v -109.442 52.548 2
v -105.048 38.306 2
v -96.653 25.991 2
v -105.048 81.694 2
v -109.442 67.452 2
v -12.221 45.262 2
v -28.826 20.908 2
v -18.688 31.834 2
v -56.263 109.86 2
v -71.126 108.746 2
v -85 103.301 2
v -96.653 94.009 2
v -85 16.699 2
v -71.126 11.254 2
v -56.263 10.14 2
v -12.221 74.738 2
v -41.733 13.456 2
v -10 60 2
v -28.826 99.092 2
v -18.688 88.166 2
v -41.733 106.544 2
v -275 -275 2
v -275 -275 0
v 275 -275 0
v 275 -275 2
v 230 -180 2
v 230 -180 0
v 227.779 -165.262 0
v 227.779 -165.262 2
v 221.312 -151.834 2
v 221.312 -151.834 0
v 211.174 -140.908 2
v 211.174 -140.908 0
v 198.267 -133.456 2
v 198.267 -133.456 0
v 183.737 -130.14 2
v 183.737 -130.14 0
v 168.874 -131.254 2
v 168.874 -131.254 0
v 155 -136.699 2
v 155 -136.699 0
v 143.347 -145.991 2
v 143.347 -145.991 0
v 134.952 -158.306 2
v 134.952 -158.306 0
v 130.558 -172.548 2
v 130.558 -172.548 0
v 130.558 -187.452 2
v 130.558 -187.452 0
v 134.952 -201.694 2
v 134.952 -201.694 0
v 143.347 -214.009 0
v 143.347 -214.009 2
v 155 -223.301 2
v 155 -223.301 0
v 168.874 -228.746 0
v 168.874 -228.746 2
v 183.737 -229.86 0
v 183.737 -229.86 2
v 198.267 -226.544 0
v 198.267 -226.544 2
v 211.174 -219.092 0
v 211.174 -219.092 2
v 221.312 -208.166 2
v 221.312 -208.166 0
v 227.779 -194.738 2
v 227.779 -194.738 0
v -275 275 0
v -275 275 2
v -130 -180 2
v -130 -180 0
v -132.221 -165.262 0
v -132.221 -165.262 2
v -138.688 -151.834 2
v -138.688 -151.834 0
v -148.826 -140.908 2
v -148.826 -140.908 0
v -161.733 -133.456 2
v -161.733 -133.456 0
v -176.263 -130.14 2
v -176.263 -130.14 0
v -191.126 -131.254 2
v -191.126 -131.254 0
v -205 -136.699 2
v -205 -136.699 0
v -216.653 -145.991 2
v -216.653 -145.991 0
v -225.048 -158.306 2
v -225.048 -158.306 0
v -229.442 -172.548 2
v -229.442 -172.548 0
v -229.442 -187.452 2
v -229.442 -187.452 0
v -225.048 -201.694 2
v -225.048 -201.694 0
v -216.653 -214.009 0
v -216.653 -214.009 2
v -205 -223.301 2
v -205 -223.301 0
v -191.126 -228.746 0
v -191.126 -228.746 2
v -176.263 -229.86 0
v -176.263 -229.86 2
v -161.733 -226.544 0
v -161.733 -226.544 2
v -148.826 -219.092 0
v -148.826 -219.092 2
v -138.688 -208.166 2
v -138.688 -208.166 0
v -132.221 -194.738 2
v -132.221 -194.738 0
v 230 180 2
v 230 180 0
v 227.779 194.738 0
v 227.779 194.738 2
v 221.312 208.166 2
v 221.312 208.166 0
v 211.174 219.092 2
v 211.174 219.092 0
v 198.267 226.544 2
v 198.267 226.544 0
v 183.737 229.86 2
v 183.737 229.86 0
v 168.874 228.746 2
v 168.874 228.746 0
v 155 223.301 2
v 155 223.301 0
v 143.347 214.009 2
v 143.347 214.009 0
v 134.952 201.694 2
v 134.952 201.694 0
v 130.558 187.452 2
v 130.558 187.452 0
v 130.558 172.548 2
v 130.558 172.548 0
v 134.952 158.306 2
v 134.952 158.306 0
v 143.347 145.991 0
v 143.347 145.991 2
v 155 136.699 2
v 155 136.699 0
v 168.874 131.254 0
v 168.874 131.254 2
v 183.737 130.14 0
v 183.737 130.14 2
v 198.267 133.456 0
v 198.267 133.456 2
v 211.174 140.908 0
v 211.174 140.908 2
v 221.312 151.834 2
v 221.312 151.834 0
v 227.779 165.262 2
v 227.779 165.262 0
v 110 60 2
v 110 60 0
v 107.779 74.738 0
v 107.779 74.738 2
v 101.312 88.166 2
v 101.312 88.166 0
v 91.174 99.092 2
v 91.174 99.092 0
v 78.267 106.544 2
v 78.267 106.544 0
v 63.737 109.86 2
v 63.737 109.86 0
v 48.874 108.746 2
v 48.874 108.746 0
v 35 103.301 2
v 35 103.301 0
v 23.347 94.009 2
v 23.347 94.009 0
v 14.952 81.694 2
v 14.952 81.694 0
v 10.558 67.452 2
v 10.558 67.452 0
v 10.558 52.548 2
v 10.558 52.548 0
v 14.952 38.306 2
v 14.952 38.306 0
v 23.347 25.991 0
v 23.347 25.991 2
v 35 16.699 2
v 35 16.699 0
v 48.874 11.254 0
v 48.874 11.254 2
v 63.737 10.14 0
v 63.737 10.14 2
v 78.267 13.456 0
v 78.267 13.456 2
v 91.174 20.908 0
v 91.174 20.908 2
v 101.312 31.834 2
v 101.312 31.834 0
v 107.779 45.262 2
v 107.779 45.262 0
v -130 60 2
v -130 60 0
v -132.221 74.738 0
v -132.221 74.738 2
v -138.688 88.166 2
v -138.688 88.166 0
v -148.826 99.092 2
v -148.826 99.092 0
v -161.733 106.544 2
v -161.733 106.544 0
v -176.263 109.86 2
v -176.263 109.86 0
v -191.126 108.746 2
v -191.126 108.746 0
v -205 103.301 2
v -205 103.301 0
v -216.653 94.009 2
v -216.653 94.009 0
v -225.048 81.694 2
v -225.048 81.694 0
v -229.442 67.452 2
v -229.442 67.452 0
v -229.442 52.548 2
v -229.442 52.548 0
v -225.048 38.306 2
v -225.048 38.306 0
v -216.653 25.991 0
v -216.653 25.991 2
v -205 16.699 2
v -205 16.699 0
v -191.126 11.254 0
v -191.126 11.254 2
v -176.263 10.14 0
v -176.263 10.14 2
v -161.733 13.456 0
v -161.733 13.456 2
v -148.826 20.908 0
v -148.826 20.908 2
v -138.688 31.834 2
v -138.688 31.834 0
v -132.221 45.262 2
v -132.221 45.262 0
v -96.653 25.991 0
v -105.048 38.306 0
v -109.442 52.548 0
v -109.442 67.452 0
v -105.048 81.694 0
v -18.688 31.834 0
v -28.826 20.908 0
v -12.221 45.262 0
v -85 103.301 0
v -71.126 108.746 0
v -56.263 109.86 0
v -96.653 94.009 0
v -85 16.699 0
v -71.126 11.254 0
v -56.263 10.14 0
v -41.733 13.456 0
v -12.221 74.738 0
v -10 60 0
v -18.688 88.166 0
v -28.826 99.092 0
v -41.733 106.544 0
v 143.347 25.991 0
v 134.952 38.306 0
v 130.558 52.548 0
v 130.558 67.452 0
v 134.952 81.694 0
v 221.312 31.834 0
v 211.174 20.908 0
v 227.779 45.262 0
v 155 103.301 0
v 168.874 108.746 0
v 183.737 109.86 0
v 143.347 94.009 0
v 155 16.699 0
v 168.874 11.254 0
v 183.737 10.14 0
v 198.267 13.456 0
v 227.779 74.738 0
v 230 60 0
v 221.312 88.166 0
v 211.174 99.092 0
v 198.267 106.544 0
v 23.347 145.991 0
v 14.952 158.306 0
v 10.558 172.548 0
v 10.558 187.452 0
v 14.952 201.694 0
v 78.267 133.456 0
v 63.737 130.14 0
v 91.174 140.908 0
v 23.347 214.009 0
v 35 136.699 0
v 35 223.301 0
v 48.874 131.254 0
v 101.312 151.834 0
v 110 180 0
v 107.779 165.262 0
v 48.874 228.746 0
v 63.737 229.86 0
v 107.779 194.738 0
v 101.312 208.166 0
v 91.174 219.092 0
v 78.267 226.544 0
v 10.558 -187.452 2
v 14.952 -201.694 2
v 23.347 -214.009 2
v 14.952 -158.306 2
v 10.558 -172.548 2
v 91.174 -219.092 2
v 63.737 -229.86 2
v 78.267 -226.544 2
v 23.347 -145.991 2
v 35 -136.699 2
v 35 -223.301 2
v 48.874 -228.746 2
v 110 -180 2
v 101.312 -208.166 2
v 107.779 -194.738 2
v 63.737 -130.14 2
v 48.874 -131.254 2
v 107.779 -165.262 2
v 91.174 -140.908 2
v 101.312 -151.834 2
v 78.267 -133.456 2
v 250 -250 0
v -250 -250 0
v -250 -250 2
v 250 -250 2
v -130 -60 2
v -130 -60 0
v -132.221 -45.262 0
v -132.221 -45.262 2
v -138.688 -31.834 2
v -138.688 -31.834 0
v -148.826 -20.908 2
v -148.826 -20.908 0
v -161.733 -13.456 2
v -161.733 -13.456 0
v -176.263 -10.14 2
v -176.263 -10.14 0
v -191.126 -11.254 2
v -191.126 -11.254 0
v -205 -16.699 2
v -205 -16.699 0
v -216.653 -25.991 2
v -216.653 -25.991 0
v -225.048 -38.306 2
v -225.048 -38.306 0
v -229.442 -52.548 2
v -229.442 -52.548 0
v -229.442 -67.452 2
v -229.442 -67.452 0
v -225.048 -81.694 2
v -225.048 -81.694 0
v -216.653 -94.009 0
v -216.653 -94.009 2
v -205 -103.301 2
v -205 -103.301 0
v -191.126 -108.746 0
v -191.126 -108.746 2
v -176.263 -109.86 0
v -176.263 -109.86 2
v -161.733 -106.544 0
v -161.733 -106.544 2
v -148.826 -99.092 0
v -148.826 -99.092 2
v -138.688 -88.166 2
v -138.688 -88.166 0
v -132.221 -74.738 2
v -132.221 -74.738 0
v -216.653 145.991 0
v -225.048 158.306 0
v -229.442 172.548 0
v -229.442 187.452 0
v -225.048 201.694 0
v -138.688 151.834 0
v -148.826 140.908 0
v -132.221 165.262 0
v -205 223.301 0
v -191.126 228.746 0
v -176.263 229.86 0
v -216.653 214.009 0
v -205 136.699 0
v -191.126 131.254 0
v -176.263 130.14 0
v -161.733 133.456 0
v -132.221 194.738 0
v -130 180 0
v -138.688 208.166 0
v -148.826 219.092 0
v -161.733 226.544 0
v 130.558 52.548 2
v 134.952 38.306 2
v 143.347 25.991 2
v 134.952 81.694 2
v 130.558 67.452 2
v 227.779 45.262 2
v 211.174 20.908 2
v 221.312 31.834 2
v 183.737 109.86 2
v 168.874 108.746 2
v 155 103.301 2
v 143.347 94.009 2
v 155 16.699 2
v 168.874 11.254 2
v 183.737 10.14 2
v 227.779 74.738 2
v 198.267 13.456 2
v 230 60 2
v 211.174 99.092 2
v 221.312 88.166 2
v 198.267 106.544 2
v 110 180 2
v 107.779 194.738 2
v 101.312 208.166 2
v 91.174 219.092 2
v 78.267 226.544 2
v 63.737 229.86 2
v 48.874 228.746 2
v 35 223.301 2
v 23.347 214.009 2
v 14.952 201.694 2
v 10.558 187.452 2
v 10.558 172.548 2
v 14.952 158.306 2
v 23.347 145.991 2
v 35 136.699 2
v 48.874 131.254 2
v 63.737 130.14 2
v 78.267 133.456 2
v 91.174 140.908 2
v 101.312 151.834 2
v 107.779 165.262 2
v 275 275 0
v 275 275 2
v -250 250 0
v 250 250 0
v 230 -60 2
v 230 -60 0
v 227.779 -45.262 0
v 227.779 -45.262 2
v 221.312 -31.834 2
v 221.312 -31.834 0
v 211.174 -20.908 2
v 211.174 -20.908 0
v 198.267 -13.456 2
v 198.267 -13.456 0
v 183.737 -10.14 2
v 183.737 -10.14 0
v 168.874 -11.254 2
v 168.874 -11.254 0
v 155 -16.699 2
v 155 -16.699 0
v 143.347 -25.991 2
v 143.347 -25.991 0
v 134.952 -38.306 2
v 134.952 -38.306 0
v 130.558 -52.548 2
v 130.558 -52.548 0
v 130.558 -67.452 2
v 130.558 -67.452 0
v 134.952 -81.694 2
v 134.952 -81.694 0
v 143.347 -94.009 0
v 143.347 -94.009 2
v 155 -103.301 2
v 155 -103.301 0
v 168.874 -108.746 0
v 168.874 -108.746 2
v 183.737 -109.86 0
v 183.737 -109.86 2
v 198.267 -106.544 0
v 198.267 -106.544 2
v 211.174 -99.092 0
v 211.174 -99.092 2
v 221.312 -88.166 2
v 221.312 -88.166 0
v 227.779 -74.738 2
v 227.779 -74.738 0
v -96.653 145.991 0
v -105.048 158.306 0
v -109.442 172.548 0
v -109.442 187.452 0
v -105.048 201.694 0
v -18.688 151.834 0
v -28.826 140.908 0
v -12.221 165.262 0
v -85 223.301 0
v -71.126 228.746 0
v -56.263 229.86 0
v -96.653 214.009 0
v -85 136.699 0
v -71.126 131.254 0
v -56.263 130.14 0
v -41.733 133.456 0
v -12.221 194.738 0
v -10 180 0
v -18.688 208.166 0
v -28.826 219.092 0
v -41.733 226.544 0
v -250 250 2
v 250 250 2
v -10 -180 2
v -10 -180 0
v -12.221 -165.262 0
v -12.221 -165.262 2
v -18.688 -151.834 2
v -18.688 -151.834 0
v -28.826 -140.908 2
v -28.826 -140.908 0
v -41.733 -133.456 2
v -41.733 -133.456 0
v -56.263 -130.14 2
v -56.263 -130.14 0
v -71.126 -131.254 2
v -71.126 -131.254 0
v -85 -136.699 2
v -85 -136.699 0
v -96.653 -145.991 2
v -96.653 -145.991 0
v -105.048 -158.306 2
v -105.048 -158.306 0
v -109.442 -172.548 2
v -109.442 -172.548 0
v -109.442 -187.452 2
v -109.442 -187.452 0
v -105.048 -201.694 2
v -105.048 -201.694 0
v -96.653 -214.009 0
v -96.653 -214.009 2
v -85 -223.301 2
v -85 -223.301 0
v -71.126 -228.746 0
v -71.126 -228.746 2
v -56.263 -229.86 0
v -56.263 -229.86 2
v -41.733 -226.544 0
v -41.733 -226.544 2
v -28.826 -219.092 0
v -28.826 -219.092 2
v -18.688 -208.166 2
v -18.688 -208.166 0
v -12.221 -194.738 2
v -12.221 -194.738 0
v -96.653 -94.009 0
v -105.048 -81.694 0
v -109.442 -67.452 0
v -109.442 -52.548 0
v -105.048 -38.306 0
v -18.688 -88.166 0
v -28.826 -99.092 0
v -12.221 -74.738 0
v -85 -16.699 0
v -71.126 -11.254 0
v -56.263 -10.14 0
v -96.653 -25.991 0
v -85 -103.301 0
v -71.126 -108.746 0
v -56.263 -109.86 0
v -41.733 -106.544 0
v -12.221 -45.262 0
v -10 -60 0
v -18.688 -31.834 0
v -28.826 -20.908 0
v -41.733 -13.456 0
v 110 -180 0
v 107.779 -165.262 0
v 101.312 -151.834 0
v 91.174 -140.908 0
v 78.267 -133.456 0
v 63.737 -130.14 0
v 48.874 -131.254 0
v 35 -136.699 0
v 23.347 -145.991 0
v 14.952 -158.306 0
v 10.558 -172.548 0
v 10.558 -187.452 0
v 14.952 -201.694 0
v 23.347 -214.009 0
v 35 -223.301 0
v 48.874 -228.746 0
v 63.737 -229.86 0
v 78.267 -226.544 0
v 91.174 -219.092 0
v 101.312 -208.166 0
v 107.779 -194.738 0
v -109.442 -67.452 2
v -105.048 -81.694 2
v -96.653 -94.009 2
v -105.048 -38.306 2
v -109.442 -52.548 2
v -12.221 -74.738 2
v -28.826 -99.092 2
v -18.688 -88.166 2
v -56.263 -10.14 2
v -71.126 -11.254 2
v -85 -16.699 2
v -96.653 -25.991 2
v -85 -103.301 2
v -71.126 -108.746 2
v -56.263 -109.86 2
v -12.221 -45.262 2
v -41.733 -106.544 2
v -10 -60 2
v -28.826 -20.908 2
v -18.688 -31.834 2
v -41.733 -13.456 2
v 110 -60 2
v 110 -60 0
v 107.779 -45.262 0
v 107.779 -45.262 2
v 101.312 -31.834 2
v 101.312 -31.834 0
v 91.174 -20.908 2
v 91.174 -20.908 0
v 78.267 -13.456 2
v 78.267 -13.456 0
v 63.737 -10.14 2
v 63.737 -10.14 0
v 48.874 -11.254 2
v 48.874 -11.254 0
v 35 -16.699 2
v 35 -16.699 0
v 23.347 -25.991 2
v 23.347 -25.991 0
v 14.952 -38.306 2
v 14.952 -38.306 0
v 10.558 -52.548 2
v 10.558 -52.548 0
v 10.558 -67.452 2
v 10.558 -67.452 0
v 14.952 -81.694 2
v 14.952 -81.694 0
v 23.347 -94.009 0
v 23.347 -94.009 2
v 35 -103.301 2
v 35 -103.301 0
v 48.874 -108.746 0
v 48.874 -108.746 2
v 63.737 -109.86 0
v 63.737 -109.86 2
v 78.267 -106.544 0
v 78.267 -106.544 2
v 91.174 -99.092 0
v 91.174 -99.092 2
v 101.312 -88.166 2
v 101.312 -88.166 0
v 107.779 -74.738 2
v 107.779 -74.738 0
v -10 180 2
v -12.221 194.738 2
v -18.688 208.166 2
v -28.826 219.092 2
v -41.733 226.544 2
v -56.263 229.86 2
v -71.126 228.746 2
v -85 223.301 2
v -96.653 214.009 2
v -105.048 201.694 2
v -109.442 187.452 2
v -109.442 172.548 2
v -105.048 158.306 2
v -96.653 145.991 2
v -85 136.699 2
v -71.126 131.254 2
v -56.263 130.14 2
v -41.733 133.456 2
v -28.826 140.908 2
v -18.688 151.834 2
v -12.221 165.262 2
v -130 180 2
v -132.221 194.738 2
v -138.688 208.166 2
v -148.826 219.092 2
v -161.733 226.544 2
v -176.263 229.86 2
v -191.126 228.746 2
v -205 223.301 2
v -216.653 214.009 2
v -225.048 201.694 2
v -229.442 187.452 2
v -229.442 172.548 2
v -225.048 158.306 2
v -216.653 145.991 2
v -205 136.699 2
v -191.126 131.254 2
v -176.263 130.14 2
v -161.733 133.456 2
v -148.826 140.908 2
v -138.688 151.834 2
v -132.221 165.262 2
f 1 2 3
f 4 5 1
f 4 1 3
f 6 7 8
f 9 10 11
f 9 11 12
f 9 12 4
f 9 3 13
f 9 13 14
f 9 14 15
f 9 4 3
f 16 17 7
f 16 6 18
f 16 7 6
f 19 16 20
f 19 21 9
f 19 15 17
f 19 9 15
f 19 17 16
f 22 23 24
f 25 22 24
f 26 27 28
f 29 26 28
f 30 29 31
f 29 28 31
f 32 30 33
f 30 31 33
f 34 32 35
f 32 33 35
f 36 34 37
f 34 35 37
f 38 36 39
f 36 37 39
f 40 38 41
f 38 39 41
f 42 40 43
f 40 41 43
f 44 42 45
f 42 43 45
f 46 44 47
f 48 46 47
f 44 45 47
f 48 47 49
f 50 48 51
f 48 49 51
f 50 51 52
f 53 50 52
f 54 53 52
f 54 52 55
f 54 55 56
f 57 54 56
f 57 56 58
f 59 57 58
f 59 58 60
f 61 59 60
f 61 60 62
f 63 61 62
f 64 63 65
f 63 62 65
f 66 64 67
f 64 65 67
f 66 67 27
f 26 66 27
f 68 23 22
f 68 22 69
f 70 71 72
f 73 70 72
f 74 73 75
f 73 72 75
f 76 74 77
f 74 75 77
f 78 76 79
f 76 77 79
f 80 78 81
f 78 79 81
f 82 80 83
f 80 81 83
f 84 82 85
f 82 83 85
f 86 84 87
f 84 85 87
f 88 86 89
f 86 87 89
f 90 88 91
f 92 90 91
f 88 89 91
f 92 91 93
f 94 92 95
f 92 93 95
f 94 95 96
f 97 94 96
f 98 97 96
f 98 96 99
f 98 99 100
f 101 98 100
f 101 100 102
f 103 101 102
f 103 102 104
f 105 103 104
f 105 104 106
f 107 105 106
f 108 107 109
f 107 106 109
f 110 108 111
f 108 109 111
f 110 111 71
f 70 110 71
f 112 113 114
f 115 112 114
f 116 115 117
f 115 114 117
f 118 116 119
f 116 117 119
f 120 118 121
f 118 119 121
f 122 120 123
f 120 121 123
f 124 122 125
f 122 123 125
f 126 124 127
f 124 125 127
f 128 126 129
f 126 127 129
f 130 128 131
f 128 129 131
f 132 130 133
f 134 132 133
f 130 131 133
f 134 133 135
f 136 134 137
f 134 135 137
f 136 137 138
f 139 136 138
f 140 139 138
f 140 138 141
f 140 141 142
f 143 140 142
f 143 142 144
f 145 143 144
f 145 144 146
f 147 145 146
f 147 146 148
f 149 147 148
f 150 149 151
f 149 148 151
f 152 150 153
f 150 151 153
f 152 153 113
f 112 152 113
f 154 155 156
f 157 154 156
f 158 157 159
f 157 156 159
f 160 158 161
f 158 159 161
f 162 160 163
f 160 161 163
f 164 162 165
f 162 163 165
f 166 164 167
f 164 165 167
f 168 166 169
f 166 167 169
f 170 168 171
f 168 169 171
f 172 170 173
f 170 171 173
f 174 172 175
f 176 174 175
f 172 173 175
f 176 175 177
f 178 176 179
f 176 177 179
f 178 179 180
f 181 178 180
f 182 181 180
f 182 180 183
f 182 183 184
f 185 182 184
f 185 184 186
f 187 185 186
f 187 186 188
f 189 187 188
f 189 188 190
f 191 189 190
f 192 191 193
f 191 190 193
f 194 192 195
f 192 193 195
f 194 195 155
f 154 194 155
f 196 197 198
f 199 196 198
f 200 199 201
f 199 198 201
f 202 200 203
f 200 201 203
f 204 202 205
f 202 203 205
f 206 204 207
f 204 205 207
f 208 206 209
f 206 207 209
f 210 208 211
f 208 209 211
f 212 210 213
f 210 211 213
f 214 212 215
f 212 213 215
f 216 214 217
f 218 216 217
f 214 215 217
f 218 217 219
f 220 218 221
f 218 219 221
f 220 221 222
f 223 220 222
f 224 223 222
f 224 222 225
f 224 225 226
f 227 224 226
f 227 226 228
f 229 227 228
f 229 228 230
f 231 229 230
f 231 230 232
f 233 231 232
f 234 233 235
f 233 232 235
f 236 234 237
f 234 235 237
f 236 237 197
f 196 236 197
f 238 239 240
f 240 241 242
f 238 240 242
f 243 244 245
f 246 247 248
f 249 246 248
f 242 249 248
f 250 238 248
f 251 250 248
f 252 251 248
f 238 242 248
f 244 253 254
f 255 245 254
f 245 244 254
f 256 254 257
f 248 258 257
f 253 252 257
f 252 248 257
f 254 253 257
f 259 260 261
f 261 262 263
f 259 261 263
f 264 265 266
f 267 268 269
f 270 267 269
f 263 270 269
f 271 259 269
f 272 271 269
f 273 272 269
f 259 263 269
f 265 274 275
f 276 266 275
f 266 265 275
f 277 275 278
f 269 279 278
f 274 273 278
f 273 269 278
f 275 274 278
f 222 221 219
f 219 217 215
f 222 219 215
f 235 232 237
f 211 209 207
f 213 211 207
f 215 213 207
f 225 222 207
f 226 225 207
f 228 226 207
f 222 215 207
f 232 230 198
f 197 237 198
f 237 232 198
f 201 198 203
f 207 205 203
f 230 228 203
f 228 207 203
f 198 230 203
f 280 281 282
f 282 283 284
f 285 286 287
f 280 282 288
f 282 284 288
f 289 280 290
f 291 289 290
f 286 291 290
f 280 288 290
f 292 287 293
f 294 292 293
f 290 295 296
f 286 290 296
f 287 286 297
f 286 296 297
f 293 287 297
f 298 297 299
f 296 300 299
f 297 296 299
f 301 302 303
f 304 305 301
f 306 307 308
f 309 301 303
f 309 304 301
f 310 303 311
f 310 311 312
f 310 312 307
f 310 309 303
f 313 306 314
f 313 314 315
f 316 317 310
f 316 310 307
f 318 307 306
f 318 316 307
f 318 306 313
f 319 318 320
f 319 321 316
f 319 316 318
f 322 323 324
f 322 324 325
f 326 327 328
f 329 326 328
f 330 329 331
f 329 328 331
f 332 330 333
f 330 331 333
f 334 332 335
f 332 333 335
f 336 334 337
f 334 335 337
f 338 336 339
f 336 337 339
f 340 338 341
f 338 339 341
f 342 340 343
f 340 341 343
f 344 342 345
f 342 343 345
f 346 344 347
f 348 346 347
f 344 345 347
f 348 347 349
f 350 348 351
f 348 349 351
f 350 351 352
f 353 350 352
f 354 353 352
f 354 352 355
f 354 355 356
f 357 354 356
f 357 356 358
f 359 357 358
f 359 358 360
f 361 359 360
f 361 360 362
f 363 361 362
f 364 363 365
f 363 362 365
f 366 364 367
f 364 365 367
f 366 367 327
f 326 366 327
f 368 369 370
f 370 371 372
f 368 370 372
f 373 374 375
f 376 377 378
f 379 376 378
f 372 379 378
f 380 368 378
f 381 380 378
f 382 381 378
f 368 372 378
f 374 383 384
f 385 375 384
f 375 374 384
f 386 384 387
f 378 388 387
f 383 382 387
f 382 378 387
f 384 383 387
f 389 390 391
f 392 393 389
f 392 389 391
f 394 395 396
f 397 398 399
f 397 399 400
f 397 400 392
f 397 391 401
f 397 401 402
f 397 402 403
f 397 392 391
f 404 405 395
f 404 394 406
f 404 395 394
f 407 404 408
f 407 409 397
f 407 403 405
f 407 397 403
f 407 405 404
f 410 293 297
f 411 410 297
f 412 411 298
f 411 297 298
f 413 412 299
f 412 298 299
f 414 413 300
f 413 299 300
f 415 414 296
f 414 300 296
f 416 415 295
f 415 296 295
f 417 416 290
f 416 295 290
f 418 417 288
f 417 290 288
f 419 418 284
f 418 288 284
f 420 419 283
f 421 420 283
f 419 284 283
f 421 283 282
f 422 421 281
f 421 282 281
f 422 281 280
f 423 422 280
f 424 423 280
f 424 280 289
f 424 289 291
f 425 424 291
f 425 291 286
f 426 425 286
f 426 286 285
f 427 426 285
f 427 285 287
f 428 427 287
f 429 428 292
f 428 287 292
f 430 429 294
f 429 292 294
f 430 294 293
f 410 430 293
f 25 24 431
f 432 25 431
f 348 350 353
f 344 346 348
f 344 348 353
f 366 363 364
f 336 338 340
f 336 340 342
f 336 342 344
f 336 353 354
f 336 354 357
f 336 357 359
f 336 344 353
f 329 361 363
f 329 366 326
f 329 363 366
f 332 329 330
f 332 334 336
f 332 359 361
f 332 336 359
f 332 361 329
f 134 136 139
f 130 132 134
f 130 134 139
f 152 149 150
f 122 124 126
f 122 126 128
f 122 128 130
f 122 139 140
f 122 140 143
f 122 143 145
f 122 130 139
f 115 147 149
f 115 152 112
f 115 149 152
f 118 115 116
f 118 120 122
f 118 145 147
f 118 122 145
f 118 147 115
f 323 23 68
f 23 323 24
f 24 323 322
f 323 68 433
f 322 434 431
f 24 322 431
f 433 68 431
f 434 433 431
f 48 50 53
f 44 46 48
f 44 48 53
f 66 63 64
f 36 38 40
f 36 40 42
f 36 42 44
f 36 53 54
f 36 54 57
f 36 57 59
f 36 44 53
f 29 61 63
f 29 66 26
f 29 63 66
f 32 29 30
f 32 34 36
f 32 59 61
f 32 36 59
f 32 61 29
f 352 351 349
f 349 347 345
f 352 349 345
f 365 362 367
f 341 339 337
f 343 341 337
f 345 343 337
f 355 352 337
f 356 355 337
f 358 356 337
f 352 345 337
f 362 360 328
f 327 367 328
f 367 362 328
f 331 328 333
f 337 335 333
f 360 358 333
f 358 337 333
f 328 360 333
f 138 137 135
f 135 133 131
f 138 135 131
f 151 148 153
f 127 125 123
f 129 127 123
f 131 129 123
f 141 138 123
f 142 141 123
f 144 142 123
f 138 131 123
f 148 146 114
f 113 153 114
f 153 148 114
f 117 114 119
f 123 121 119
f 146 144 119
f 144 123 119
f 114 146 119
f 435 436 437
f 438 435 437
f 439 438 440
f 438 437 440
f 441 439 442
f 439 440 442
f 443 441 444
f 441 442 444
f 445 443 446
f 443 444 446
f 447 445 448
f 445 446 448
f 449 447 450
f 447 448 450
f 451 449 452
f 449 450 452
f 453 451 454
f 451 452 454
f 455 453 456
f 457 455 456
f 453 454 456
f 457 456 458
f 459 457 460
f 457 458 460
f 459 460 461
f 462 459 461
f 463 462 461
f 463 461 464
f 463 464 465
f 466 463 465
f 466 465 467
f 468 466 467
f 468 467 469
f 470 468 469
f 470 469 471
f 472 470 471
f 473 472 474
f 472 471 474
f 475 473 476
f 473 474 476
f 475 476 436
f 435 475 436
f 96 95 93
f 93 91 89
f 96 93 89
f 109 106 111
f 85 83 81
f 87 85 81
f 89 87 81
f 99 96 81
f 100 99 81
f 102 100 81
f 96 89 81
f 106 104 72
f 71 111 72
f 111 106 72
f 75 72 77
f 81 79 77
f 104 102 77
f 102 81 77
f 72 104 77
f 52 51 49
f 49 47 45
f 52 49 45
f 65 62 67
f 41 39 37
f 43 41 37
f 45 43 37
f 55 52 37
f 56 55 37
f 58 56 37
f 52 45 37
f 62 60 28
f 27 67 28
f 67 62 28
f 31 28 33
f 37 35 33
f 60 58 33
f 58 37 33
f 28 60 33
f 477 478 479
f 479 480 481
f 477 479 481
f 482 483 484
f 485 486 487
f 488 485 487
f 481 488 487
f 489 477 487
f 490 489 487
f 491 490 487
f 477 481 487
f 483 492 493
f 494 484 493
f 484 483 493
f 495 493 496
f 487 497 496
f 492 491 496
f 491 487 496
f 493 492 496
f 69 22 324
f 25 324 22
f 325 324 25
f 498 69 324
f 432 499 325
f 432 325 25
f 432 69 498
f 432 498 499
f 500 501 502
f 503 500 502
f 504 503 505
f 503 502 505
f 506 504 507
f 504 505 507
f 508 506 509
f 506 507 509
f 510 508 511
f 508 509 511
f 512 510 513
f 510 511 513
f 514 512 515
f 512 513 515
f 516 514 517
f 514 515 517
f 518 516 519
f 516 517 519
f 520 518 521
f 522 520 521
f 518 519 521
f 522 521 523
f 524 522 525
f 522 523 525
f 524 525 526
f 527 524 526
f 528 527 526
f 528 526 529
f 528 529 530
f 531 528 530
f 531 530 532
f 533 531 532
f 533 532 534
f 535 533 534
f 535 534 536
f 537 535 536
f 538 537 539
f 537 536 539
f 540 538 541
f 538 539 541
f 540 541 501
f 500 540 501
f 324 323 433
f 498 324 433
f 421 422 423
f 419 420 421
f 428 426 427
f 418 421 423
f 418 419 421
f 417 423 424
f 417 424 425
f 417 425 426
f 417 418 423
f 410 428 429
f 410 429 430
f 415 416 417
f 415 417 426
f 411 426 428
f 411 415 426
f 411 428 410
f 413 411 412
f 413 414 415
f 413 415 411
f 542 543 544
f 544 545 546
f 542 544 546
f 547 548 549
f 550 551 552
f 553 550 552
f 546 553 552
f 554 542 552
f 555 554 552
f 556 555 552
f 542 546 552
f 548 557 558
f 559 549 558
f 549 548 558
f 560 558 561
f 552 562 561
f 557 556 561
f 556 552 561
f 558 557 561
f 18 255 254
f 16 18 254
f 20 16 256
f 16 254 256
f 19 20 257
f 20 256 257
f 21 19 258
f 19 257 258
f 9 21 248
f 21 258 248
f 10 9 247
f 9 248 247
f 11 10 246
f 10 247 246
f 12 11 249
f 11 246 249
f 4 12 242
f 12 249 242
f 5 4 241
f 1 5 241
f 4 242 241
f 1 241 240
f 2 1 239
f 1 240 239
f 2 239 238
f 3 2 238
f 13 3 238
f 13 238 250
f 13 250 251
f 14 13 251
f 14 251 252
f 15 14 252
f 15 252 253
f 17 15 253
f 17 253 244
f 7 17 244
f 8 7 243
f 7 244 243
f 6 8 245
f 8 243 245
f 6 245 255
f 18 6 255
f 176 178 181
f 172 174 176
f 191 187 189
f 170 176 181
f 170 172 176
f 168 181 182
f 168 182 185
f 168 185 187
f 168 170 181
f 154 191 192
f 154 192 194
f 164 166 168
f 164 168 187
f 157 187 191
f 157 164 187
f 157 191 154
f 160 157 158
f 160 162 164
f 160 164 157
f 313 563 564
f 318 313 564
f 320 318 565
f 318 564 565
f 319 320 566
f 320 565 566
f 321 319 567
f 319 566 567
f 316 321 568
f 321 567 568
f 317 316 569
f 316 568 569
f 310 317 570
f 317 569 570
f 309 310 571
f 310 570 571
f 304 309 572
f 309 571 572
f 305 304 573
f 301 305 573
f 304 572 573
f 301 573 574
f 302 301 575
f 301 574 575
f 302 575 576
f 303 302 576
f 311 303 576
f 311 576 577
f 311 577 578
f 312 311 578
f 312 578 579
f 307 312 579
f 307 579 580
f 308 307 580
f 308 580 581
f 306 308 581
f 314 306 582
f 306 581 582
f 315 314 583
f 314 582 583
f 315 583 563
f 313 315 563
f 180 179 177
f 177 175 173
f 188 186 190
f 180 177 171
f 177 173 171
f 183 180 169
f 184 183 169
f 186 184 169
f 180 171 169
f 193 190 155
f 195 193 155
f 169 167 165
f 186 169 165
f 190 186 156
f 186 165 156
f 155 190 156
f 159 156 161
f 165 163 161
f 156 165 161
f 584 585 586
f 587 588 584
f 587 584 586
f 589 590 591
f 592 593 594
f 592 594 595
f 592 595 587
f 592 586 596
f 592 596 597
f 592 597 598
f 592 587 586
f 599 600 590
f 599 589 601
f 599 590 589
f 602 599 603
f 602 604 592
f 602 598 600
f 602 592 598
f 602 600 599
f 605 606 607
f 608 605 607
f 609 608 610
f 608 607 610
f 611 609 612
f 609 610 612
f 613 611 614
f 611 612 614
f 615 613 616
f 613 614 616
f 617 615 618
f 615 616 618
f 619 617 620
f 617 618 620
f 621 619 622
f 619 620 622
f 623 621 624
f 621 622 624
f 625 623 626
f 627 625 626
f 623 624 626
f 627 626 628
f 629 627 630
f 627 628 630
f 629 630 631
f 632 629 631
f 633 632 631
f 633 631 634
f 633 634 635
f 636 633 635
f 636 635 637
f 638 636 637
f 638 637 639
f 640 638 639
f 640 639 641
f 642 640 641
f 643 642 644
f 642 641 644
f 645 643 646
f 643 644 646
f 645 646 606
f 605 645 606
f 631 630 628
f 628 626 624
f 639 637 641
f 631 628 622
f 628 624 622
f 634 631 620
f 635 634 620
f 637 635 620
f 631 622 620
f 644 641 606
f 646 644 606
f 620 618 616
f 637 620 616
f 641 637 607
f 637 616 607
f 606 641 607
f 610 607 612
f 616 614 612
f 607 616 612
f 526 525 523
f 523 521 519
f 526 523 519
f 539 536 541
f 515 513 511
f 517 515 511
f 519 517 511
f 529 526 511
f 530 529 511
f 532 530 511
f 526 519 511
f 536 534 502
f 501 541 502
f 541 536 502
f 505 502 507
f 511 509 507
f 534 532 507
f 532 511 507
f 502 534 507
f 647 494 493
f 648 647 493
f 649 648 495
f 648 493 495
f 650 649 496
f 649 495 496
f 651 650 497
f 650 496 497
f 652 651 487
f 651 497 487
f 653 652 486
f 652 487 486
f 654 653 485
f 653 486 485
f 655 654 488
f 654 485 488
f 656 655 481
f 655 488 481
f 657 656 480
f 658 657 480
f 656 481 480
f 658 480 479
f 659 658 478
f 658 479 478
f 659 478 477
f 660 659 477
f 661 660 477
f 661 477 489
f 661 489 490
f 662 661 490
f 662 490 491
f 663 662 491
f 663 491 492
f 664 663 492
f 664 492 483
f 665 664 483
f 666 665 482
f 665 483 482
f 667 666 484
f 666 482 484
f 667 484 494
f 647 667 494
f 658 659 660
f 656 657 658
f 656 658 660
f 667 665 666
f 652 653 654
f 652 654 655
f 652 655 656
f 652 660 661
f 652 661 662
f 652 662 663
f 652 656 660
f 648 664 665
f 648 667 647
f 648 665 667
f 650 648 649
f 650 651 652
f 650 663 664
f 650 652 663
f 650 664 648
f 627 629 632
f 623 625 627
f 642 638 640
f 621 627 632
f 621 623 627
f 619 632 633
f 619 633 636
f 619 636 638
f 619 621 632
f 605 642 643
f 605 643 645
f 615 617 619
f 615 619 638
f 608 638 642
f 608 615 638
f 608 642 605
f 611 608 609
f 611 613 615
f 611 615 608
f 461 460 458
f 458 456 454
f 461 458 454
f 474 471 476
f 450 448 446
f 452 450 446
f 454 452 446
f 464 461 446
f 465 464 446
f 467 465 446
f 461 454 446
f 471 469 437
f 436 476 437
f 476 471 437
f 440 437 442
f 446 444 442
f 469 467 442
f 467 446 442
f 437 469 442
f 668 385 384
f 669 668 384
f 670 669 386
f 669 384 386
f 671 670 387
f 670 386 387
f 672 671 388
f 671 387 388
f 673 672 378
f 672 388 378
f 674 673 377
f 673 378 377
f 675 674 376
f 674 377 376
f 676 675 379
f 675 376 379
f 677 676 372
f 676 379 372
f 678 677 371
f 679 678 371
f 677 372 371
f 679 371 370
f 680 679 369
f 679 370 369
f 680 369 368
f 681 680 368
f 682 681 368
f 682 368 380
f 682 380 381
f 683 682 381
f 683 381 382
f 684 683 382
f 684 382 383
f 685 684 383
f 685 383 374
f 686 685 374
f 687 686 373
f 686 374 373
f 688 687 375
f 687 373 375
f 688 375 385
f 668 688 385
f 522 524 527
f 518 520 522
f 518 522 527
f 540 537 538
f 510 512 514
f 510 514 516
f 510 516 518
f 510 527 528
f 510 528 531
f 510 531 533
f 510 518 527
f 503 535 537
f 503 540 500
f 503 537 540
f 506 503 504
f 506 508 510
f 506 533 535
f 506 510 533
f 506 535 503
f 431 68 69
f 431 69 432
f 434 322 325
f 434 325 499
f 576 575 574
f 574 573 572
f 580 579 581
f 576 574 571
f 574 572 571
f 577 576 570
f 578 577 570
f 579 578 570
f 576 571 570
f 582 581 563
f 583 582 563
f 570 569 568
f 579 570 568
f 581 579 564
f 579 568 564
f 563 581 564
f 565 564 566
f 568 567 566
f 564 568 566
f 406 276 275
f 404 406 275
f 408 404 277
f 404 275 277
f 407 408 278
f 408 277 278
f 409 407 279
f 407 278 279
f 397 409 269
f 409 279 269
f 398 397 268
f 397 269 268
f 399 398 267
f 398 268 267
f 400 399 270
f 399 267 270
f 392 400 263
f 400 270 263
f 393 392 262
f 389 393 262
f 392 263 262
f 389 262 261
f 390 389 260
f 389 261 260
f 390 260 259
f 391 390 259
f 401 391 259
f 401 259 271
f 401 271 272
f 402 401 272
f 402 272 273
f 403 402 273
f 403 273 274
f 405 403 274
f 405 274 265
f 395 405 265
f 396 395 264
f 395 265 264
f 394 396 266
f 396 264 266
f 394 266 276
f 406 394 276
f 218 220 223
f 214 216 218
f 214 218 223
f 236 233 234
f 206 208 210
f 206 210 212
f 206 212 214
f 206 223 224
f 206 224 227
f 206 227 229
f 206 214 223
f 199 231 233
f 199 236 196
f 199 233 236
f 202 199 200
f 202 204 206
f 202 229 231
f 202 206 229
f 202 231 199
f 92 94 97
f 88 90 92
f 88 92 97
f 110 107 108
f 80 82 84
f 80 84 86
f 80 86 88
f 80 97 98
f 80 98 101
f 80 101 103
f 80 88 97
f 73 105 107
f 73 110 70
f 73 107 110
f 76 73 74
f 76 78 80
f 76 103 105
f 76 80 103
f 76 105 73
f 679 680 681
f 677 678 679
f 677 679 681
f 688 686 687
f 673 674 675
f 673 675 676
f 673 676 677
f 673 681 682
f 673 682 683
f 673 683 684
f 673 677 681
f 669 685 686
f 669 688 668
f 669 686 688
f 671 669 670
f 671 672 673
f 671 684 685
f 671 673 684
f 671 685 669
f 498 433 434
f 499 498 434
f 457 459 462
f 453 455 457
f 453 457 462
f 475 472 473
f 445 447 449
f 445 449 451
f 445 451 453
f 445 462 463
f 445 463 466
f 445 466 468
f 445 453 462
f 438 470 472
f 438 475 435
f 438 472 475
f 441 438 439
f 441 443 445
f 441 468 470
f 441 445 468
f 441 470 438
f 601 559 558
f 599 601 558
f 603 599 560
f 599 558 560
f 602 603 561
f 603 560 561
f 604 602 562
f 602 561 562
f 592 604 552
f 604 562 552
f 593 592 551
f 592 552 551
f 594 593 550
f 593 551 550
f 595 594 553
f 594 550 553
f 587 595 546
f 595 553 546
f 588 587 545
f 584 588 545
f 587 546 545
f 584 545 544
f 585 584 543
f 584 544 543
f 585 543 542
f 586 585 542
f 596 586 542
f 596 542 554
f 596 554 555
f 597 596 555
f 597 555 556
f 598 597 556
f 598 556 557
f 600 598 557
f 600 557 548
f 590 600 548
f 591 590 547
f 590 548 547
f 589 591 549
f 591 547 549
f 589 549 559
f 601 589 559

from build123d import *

# Parameters (mm, degrees)
F0_W     = 550
F0_H     = 550
F0_W_2   = 500
F0_H_2   = 500
F0_R     = 50
F1_DEPTH = 2


with BuildPart() as f1:
    # F0 (on Top) → F1 (new body)
    with BuildSketch(Plane.XY):
        Rectangle(F0_W, F0_H)
        Rectangle(F0_W_2, F0_H_2, mode=Mode.SUBTRACT)
        with Locations((-180, 180)):
            Circle(F0_R)
        with Locations((-60, 180)):
            Circle(F0_R)
        with Locations((60, 180)):
            Circle(F0_R)
        with Locations((180, 180)):
            Circle(F0_R)
        with Locations((180, 60)):
            Circle(F0_R)
        with Locations((60, 60)):
            Circle(F0_R)
        with Locations((-60, 60)):
            Circle(F0_R)
        with Locations((-180, 60)):
            Circle(F0_R)
        with Locations((-180, -60)):
            Circle(F0_R)
        with Locations((-60, -60)):
            Circle(F0_R)
        with Locations((60, -60)):
            Circle(F0_R)
        with Locations((180, -60)):
            Circle(F0_R)
        with Locations((180, -180)):
            Circle(F0_R)
        with Locations((60, -180)):
            Circle(F0_R)
        with Locations((-60, -180)):
            Circle(F0_R)
        with Locations((-180, -180)):
            Circle(F0_R)
    extrude(amount=F1_DEPTH)


solid = f1.part
